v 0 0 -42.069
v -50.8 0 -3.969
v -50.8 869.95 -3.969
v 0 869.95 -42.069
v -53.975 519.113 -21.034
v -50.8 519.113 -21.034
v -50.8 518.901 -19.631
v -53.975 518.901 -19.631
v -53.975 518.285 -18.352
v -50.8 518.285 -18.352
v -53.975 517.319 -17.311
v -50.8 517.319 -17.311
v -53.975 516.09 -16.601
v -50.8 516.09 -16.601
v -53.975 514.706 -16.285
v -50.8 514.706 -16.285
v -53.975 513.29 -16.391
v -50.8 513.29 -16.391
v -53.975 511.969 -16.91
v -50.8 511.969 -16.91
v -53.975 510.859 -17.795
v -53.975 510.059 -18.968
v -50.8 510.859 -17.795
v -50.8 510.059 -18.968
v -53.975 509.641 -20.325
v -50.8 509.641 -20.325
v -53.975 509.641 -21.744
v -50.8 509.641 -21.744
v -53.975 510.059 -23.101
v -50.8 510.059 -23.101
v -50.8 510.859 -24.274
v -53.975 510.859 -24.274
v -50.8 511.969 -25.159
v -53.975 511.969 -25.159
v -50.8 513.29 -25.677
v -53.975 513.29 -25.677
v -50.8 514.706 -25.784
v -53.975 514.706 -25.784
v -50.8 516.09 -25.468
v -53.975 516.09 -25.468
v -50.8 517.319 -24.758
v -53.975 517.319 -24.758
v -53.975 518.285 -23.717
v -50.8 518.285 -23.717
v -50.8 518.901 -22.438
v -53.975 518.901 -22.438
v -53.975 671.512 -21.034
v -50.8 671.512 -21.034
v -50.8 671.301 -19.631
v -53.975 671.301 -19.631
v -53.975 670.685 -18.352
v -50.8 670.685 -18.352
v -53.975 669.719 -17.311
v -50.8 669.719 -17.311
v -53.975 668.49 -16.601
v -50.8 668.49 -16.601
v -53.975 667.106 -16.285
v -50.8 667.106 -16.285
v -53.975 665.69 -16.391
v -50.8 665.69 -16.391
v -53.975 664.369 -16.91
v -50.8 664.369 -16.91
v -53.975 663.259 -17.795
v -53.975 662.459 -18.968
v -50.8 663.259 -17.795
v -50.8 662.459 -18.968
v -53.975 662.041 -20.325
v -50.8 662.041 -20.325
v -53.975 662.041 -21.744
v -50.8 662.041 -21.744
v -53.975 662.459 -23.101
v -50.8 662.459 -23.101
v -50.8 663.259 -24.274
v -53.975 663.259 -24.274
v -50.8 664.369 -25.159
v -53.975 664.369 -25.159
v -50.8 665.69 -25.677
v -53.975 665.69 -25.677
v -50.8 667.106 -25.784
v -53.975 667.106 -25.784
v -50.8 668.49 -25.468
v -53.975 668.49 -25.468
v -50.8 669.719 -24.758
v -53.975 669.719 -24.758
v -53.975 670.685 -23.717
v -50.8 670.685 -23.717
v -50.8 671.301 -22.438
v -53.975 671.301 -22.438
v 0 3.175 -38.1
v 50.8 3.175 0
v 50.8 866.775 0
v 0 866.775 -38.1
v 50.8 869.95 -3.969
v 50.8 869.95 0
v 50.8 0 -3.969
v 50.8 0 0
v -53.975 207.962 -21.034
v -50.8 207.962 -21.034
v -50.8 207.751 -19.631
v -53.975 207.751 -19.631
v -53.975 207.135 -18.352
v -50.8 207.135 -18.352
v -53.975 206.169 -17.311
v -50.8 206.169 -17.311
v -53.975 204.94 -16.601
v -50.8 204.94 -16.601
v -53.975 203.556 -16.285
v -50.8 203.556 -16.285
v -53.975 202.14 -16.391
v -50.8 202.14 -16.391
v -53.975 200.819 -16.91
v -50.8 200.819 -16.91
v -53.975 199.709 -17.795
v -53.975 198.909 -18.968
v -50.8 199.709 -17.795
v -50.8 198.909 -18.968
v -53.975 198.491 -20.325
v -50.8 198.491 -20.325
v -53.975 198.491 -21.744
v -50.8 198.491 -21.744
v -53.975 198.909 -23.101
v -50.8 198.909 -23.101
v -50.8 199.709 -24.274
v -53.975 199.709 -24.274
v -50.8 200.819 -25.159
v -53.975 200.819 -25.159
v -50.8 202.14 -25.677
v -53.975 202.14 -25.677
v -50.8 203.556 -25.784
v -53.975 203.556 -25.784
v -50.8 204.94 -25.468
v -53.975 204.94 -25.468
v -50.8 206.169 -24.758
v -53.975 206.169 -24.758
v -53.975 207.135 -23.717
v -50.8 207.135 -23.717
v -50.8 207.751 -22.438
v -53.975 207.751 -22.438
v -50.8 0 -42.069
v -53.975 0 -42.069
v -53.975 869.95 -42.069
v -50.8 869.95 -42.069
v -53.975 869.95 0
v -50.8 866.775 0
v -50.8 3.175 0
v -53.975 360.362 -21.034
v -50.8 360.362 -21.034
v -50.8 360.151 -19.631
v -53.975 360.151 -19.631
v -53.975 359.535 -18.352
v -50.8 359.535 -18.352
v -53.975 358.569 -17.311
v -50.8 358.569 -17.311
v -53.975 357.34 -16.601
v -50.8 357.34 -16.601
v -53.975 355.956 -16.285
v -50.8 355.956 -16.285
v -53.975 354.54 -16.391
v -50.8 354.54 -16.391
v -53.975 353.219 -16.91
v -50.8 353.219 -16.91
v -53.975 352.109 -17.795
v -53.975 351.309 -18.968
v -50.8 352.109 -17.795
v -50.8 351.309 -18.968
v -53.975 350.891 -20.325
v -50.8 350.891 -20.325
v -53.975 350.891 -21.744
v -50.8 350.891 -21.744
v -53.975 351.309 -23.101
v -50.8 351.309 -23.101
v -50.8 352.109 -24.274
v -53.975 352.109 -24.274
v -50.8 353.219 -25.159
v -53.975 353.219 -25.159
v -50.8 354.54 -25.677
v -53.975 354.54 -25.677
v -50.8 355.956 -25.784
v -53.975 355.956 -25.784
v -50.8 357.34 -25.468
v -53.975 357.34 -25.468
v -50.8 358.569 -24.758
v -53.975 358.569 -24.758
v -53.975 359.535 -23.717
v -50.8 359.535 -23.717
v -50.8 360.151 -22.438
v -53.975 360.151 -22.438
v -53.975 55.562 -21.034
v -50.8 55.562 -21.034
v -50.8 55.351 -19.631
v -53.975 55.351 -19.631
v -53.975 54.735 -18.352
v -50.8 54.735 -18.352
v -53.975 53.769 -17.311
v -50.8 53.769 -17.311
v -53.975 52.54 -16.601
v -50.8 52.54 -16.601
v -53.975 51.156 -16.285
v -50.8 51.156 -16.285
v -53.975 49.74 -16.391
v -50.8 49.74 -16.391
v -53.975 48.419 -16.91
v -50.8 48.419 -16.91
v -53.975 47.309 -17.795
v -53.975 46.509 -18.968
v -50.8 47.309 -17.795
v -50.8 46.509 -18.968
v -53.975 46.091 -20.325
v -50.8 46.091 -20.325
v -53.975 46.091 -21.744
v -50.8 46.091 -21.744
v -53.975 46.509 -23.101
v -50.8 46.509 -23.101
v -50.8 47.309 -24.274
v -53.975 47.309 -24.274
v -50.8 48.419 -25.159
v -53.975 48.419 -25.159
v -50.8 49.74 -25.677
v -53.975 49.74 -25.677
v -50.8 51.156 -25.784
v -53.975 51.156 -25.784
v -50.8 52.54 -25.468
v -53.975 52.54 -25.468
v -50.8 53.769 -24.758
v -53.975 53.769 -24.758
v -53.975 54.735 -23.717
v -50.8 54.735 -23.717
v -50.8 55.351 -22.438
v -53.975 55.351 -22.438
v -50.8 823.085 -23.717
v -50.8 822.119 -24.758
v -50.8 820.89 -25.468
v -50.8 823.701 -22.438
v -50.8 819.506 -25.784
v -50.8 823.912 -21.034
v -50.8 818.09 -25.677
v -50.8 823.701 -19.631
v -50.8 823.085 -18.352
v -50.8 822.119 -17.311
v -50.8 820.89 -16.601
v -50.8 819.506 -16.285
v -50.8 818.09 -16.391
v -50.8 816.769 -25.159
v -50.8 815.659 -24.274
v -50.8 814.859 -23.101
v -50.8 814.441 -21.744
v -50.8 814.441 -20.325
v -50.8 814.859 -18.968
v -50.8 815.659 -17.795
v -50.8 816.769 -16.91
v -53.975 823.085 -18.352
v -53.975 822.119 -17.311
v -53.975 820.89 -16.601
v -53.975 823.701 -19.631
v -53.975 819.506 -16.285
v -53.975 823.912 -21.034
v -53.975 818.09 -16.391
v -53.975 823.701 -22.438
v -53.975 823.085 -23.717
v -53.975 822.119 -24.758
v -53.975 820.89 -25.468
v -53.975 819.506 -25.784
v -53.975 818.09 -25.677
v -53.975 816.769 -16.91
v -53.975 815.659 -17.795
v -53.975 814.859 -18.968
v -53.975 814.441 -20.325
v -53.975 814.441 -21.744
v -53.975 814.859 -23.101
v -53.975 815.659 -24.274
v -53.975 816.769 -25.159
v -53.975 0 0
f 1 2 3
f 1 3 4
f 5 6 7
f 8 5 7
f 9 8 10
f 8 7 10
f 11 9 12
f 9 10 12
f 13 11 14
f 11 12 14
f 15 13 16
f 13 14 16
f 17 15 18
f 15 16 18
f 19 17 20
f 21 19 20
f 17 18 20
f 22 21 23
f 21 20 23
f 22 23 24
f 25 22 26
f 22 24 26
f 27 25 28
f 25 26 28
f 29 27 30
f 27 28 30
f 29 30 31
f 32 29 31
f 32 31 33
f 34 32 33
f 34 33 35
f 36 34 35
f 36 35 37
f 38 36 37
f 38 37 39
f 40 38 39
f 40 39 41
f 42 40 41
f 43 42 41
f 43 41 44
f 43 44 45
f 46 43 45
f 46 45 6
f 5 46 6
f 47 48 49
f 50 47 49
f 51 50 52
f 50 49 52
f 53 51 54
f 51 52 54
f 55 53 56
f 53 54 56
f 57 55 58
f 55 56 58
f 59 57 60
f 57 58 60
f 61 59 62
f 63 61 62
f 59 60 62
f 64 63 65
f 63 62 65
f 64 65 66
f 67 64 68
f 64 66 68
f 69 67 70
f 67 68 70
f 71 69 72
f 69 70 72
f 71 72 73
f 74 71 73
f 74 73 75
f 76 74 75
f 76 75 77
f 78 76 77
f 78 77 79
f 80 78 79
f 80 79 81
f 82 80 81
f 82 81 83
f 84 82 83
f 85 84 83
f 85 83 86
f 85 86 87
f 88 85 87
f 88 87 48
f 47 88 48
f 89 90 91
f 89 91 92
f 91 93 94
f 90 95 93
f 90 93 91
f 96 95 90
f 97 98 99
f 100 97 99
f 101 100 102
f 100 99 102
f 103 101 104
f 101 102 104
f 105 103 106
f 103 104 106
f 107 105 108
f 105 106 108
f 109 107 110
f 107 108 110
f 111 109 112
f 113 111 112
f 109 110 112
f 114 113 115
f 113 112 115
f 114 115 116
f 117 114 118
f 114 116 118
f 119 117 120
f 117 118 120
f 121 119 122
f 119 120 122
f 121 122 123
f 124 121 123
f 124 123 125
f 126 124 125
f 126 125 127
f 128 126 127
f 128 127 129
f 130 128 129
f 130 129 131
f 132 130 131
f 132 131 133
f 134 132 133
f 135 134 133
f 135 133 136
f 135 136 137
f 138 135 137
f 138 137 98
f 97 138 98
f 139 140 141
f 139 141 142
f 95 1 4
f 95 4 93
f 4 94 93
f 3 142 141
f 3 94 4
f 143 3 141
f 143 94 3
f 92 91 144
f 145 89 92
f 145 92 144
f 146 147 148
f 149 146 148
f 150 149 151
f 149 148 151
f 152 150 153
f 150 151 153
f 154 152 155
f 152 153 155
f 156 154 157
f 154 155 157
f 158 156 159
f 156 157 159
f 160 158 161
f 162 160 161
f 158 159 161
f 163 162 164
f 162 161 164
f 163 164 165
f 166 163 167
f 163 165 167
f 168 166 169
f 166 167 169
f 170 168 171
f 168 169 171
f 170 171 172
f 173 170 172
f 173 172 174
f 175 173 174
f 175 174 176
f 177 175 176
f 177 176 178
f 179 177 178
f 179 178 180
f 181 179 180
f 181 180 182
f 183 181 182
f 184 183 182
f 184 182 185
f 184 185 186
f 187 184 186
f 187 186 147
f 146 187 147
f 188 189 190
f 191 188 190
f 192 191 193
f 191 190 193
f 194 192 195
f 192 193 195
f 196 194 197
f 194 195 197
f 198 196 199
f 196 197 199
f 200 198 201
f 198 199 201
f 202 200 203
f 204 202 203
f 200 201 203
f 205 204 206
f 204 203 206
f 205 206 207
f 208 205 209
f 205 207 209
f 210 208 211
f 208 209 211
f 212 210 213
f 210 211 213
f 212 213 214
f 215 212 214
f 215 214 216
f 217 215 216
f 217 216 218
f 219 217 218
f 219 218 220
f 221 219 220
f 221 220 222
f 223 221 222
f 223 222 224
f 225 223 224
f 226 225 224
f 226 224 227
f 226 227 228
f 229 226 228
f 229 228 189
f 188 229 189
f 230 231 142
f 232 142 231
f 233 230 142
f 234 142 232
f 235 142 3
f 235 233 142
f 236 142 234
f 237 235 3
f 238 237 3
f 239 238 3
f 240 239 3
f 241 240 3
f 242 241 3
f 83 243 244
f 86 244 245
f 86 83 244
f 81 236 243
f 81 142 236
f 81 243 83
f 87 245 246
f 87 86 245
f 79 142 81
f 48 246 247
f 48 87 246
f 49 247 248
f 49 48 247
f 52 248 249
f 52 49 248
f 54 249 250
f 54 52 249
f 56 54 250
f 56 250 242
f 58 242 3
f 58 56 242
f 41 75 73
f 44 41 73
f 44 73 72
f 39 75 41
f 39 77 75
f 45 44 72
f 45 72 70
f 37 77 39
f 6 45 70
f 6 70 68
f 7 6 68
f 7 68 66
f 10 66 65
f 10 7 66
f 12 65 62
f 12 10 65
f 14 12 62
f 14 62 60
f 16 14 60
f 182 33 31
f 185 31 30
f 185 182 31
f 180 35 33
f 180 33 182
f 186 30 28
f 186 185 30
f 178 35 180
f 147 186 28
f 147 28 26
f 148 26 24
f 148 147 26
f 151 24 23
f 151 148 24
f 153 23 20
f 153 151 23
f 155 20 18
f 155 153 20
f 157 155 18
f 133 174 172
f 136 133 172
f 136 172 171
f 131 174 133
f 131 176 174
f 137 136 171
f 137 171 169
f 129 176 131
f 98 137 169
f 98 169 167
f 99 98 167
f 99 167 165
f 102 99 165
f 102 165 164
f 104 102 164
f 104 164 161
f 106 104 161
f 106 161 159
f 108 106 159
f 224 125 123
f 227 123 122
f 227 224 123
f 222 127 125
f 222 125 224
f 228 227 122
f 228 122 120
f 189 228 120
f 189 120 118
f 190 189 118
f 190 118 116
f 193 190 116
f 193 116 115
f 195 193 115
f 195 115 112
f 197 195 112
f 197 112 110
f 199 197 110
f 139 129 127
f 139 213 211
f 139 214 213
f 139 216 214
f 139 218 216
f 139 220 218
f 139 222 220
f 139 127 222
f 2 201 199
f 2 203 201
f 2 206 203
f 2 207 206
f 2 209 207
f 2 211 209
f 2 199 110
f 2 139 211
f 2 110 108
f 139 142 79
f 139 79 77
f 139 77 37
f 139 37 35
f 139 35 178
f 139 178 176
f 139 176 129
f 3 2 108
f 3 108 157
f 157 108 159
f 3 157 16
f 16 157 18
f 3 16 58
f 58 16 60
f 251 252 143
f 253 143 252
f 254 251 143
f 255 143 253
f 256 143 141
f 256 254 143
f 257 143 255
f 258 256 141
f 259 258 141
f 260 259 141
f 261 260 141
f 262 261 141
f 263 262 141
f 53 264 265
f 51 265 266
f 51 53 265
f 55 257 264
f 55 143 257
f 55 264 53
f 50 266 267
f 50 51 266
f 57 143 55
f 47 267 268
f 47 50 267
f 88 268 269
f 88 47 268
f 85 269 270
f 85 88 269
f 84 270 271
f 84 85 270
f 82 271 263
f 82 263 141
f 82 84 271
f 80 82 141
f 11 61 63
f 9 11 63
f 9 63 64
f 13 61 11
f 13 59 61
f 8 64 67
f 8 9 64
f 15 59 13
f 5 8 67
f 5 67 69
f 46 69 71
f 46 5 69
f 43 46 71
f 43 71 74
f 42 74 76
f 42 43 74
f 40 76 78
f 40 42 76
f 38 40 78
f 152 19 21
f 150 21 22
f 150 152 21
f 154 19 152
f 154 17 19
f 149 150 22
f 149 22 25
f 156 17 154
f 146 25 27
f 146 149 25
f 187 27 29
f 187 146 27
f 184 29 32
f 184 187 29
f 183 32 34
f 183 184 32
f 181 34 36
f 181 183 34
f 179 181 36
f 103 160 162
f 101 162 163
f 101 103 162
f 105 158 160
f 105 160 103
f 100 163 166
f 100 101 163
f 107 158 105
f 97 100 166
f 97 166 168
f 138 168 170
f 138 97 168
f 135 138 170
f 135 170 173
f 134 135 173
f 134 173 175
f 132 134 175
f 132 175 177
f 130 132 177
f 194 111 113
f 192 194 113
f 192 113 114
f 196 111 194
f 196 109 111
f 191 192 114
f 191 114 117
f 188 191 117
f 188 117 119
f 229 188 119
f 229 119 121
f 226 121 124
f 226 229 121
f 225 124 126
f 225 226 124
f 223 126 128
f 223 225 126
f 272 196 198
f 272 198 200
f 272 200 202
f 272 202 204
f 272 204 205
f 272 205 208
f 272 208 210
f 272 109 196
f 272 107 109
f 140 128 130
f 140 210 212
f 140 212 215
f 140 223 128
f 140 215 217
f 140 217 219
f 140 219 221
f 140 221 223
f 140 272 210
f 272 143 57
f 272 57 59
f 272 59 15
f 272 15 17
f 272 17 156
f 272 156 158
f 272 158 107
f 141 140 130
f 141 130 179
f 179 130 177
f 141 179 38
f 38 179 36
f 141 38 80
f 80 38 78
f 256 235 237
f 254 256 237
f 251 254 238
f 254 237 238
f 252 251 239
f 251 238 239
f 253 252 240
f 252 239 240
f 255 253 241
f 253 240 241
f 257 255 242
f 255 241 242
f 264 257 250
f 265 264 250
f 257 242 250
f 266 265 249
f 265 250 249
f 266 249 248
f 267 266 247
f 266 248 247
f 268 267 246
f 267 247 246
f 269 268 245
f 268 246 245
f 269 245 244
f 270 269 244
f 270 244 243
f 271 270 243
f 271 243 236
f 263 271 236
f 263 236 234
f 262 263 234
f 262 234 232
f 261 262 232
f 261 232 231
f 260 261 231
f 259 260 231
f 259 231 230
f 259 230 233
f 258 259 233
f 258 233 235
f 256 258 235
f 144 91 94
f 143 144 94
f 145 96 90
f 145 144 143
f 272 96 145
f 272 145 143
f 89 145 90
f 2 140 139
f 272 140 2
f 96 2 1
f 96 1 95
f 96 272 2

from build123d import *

# Parameters (mm, degrees)
F1_DEPTH = 869.95
F3_DEPTH = 3.175
F5_DEPTH = 3.175
F7_D     = 9.525
F7_DEPTH = 5.08


with BuildPart() as f1:
    # F0 (on Front) → F1 (new body)
    with BuildSketch(Plane.XZ):
        Polygon((0, -38.1), (-50.8, 0), (-50.8, -3.96875), (0, -42.06875), (50.8, -3.96875), (50.8, 0), align=None)
        Polygon((-50.8, -3.96875), (-50.8, 0), (-53.975, 0), (-53.975, -42.06875), (-50.8, -42.06875), align=None)
    extrude(amount=-F1_DEPTH)

    # F2 (on face) → F3 (join)
    with BuildSketch(Plane(origin=(0, 869.95, 0), x_dir=(-1, 0, 0), z_dir=(0, 1, 0))):
        Polygon((50.8, 0), (-50.8, 0), (0, -38.1), align=None)
    extrude(amount=-F3_DEPTH)

    # F4 (on face) → F5 (join)
    with BuildSketch(Plane.XZ):
        Polygon((50.8, 0), (-50.8, 0), (0, -38.1), align=None)
    extrude(amount=-F5_DEPTH)

    # F7
    with Locations(Plane(origin=(-53.975, 0, 0), x_dir=(0, -1, 0), z_dir=(-1, 0, 0))):
        with Locations((-819.15, -21.034375), (-666.75, -21.034375), (-514.35, -21.034375), (-355.6, -21.034375), (-203.2, -21.034375), (-50.8, -21.034375)):
            Hole(F7_D / 2, depth=F7_DEPTH)


solid = f1.part
